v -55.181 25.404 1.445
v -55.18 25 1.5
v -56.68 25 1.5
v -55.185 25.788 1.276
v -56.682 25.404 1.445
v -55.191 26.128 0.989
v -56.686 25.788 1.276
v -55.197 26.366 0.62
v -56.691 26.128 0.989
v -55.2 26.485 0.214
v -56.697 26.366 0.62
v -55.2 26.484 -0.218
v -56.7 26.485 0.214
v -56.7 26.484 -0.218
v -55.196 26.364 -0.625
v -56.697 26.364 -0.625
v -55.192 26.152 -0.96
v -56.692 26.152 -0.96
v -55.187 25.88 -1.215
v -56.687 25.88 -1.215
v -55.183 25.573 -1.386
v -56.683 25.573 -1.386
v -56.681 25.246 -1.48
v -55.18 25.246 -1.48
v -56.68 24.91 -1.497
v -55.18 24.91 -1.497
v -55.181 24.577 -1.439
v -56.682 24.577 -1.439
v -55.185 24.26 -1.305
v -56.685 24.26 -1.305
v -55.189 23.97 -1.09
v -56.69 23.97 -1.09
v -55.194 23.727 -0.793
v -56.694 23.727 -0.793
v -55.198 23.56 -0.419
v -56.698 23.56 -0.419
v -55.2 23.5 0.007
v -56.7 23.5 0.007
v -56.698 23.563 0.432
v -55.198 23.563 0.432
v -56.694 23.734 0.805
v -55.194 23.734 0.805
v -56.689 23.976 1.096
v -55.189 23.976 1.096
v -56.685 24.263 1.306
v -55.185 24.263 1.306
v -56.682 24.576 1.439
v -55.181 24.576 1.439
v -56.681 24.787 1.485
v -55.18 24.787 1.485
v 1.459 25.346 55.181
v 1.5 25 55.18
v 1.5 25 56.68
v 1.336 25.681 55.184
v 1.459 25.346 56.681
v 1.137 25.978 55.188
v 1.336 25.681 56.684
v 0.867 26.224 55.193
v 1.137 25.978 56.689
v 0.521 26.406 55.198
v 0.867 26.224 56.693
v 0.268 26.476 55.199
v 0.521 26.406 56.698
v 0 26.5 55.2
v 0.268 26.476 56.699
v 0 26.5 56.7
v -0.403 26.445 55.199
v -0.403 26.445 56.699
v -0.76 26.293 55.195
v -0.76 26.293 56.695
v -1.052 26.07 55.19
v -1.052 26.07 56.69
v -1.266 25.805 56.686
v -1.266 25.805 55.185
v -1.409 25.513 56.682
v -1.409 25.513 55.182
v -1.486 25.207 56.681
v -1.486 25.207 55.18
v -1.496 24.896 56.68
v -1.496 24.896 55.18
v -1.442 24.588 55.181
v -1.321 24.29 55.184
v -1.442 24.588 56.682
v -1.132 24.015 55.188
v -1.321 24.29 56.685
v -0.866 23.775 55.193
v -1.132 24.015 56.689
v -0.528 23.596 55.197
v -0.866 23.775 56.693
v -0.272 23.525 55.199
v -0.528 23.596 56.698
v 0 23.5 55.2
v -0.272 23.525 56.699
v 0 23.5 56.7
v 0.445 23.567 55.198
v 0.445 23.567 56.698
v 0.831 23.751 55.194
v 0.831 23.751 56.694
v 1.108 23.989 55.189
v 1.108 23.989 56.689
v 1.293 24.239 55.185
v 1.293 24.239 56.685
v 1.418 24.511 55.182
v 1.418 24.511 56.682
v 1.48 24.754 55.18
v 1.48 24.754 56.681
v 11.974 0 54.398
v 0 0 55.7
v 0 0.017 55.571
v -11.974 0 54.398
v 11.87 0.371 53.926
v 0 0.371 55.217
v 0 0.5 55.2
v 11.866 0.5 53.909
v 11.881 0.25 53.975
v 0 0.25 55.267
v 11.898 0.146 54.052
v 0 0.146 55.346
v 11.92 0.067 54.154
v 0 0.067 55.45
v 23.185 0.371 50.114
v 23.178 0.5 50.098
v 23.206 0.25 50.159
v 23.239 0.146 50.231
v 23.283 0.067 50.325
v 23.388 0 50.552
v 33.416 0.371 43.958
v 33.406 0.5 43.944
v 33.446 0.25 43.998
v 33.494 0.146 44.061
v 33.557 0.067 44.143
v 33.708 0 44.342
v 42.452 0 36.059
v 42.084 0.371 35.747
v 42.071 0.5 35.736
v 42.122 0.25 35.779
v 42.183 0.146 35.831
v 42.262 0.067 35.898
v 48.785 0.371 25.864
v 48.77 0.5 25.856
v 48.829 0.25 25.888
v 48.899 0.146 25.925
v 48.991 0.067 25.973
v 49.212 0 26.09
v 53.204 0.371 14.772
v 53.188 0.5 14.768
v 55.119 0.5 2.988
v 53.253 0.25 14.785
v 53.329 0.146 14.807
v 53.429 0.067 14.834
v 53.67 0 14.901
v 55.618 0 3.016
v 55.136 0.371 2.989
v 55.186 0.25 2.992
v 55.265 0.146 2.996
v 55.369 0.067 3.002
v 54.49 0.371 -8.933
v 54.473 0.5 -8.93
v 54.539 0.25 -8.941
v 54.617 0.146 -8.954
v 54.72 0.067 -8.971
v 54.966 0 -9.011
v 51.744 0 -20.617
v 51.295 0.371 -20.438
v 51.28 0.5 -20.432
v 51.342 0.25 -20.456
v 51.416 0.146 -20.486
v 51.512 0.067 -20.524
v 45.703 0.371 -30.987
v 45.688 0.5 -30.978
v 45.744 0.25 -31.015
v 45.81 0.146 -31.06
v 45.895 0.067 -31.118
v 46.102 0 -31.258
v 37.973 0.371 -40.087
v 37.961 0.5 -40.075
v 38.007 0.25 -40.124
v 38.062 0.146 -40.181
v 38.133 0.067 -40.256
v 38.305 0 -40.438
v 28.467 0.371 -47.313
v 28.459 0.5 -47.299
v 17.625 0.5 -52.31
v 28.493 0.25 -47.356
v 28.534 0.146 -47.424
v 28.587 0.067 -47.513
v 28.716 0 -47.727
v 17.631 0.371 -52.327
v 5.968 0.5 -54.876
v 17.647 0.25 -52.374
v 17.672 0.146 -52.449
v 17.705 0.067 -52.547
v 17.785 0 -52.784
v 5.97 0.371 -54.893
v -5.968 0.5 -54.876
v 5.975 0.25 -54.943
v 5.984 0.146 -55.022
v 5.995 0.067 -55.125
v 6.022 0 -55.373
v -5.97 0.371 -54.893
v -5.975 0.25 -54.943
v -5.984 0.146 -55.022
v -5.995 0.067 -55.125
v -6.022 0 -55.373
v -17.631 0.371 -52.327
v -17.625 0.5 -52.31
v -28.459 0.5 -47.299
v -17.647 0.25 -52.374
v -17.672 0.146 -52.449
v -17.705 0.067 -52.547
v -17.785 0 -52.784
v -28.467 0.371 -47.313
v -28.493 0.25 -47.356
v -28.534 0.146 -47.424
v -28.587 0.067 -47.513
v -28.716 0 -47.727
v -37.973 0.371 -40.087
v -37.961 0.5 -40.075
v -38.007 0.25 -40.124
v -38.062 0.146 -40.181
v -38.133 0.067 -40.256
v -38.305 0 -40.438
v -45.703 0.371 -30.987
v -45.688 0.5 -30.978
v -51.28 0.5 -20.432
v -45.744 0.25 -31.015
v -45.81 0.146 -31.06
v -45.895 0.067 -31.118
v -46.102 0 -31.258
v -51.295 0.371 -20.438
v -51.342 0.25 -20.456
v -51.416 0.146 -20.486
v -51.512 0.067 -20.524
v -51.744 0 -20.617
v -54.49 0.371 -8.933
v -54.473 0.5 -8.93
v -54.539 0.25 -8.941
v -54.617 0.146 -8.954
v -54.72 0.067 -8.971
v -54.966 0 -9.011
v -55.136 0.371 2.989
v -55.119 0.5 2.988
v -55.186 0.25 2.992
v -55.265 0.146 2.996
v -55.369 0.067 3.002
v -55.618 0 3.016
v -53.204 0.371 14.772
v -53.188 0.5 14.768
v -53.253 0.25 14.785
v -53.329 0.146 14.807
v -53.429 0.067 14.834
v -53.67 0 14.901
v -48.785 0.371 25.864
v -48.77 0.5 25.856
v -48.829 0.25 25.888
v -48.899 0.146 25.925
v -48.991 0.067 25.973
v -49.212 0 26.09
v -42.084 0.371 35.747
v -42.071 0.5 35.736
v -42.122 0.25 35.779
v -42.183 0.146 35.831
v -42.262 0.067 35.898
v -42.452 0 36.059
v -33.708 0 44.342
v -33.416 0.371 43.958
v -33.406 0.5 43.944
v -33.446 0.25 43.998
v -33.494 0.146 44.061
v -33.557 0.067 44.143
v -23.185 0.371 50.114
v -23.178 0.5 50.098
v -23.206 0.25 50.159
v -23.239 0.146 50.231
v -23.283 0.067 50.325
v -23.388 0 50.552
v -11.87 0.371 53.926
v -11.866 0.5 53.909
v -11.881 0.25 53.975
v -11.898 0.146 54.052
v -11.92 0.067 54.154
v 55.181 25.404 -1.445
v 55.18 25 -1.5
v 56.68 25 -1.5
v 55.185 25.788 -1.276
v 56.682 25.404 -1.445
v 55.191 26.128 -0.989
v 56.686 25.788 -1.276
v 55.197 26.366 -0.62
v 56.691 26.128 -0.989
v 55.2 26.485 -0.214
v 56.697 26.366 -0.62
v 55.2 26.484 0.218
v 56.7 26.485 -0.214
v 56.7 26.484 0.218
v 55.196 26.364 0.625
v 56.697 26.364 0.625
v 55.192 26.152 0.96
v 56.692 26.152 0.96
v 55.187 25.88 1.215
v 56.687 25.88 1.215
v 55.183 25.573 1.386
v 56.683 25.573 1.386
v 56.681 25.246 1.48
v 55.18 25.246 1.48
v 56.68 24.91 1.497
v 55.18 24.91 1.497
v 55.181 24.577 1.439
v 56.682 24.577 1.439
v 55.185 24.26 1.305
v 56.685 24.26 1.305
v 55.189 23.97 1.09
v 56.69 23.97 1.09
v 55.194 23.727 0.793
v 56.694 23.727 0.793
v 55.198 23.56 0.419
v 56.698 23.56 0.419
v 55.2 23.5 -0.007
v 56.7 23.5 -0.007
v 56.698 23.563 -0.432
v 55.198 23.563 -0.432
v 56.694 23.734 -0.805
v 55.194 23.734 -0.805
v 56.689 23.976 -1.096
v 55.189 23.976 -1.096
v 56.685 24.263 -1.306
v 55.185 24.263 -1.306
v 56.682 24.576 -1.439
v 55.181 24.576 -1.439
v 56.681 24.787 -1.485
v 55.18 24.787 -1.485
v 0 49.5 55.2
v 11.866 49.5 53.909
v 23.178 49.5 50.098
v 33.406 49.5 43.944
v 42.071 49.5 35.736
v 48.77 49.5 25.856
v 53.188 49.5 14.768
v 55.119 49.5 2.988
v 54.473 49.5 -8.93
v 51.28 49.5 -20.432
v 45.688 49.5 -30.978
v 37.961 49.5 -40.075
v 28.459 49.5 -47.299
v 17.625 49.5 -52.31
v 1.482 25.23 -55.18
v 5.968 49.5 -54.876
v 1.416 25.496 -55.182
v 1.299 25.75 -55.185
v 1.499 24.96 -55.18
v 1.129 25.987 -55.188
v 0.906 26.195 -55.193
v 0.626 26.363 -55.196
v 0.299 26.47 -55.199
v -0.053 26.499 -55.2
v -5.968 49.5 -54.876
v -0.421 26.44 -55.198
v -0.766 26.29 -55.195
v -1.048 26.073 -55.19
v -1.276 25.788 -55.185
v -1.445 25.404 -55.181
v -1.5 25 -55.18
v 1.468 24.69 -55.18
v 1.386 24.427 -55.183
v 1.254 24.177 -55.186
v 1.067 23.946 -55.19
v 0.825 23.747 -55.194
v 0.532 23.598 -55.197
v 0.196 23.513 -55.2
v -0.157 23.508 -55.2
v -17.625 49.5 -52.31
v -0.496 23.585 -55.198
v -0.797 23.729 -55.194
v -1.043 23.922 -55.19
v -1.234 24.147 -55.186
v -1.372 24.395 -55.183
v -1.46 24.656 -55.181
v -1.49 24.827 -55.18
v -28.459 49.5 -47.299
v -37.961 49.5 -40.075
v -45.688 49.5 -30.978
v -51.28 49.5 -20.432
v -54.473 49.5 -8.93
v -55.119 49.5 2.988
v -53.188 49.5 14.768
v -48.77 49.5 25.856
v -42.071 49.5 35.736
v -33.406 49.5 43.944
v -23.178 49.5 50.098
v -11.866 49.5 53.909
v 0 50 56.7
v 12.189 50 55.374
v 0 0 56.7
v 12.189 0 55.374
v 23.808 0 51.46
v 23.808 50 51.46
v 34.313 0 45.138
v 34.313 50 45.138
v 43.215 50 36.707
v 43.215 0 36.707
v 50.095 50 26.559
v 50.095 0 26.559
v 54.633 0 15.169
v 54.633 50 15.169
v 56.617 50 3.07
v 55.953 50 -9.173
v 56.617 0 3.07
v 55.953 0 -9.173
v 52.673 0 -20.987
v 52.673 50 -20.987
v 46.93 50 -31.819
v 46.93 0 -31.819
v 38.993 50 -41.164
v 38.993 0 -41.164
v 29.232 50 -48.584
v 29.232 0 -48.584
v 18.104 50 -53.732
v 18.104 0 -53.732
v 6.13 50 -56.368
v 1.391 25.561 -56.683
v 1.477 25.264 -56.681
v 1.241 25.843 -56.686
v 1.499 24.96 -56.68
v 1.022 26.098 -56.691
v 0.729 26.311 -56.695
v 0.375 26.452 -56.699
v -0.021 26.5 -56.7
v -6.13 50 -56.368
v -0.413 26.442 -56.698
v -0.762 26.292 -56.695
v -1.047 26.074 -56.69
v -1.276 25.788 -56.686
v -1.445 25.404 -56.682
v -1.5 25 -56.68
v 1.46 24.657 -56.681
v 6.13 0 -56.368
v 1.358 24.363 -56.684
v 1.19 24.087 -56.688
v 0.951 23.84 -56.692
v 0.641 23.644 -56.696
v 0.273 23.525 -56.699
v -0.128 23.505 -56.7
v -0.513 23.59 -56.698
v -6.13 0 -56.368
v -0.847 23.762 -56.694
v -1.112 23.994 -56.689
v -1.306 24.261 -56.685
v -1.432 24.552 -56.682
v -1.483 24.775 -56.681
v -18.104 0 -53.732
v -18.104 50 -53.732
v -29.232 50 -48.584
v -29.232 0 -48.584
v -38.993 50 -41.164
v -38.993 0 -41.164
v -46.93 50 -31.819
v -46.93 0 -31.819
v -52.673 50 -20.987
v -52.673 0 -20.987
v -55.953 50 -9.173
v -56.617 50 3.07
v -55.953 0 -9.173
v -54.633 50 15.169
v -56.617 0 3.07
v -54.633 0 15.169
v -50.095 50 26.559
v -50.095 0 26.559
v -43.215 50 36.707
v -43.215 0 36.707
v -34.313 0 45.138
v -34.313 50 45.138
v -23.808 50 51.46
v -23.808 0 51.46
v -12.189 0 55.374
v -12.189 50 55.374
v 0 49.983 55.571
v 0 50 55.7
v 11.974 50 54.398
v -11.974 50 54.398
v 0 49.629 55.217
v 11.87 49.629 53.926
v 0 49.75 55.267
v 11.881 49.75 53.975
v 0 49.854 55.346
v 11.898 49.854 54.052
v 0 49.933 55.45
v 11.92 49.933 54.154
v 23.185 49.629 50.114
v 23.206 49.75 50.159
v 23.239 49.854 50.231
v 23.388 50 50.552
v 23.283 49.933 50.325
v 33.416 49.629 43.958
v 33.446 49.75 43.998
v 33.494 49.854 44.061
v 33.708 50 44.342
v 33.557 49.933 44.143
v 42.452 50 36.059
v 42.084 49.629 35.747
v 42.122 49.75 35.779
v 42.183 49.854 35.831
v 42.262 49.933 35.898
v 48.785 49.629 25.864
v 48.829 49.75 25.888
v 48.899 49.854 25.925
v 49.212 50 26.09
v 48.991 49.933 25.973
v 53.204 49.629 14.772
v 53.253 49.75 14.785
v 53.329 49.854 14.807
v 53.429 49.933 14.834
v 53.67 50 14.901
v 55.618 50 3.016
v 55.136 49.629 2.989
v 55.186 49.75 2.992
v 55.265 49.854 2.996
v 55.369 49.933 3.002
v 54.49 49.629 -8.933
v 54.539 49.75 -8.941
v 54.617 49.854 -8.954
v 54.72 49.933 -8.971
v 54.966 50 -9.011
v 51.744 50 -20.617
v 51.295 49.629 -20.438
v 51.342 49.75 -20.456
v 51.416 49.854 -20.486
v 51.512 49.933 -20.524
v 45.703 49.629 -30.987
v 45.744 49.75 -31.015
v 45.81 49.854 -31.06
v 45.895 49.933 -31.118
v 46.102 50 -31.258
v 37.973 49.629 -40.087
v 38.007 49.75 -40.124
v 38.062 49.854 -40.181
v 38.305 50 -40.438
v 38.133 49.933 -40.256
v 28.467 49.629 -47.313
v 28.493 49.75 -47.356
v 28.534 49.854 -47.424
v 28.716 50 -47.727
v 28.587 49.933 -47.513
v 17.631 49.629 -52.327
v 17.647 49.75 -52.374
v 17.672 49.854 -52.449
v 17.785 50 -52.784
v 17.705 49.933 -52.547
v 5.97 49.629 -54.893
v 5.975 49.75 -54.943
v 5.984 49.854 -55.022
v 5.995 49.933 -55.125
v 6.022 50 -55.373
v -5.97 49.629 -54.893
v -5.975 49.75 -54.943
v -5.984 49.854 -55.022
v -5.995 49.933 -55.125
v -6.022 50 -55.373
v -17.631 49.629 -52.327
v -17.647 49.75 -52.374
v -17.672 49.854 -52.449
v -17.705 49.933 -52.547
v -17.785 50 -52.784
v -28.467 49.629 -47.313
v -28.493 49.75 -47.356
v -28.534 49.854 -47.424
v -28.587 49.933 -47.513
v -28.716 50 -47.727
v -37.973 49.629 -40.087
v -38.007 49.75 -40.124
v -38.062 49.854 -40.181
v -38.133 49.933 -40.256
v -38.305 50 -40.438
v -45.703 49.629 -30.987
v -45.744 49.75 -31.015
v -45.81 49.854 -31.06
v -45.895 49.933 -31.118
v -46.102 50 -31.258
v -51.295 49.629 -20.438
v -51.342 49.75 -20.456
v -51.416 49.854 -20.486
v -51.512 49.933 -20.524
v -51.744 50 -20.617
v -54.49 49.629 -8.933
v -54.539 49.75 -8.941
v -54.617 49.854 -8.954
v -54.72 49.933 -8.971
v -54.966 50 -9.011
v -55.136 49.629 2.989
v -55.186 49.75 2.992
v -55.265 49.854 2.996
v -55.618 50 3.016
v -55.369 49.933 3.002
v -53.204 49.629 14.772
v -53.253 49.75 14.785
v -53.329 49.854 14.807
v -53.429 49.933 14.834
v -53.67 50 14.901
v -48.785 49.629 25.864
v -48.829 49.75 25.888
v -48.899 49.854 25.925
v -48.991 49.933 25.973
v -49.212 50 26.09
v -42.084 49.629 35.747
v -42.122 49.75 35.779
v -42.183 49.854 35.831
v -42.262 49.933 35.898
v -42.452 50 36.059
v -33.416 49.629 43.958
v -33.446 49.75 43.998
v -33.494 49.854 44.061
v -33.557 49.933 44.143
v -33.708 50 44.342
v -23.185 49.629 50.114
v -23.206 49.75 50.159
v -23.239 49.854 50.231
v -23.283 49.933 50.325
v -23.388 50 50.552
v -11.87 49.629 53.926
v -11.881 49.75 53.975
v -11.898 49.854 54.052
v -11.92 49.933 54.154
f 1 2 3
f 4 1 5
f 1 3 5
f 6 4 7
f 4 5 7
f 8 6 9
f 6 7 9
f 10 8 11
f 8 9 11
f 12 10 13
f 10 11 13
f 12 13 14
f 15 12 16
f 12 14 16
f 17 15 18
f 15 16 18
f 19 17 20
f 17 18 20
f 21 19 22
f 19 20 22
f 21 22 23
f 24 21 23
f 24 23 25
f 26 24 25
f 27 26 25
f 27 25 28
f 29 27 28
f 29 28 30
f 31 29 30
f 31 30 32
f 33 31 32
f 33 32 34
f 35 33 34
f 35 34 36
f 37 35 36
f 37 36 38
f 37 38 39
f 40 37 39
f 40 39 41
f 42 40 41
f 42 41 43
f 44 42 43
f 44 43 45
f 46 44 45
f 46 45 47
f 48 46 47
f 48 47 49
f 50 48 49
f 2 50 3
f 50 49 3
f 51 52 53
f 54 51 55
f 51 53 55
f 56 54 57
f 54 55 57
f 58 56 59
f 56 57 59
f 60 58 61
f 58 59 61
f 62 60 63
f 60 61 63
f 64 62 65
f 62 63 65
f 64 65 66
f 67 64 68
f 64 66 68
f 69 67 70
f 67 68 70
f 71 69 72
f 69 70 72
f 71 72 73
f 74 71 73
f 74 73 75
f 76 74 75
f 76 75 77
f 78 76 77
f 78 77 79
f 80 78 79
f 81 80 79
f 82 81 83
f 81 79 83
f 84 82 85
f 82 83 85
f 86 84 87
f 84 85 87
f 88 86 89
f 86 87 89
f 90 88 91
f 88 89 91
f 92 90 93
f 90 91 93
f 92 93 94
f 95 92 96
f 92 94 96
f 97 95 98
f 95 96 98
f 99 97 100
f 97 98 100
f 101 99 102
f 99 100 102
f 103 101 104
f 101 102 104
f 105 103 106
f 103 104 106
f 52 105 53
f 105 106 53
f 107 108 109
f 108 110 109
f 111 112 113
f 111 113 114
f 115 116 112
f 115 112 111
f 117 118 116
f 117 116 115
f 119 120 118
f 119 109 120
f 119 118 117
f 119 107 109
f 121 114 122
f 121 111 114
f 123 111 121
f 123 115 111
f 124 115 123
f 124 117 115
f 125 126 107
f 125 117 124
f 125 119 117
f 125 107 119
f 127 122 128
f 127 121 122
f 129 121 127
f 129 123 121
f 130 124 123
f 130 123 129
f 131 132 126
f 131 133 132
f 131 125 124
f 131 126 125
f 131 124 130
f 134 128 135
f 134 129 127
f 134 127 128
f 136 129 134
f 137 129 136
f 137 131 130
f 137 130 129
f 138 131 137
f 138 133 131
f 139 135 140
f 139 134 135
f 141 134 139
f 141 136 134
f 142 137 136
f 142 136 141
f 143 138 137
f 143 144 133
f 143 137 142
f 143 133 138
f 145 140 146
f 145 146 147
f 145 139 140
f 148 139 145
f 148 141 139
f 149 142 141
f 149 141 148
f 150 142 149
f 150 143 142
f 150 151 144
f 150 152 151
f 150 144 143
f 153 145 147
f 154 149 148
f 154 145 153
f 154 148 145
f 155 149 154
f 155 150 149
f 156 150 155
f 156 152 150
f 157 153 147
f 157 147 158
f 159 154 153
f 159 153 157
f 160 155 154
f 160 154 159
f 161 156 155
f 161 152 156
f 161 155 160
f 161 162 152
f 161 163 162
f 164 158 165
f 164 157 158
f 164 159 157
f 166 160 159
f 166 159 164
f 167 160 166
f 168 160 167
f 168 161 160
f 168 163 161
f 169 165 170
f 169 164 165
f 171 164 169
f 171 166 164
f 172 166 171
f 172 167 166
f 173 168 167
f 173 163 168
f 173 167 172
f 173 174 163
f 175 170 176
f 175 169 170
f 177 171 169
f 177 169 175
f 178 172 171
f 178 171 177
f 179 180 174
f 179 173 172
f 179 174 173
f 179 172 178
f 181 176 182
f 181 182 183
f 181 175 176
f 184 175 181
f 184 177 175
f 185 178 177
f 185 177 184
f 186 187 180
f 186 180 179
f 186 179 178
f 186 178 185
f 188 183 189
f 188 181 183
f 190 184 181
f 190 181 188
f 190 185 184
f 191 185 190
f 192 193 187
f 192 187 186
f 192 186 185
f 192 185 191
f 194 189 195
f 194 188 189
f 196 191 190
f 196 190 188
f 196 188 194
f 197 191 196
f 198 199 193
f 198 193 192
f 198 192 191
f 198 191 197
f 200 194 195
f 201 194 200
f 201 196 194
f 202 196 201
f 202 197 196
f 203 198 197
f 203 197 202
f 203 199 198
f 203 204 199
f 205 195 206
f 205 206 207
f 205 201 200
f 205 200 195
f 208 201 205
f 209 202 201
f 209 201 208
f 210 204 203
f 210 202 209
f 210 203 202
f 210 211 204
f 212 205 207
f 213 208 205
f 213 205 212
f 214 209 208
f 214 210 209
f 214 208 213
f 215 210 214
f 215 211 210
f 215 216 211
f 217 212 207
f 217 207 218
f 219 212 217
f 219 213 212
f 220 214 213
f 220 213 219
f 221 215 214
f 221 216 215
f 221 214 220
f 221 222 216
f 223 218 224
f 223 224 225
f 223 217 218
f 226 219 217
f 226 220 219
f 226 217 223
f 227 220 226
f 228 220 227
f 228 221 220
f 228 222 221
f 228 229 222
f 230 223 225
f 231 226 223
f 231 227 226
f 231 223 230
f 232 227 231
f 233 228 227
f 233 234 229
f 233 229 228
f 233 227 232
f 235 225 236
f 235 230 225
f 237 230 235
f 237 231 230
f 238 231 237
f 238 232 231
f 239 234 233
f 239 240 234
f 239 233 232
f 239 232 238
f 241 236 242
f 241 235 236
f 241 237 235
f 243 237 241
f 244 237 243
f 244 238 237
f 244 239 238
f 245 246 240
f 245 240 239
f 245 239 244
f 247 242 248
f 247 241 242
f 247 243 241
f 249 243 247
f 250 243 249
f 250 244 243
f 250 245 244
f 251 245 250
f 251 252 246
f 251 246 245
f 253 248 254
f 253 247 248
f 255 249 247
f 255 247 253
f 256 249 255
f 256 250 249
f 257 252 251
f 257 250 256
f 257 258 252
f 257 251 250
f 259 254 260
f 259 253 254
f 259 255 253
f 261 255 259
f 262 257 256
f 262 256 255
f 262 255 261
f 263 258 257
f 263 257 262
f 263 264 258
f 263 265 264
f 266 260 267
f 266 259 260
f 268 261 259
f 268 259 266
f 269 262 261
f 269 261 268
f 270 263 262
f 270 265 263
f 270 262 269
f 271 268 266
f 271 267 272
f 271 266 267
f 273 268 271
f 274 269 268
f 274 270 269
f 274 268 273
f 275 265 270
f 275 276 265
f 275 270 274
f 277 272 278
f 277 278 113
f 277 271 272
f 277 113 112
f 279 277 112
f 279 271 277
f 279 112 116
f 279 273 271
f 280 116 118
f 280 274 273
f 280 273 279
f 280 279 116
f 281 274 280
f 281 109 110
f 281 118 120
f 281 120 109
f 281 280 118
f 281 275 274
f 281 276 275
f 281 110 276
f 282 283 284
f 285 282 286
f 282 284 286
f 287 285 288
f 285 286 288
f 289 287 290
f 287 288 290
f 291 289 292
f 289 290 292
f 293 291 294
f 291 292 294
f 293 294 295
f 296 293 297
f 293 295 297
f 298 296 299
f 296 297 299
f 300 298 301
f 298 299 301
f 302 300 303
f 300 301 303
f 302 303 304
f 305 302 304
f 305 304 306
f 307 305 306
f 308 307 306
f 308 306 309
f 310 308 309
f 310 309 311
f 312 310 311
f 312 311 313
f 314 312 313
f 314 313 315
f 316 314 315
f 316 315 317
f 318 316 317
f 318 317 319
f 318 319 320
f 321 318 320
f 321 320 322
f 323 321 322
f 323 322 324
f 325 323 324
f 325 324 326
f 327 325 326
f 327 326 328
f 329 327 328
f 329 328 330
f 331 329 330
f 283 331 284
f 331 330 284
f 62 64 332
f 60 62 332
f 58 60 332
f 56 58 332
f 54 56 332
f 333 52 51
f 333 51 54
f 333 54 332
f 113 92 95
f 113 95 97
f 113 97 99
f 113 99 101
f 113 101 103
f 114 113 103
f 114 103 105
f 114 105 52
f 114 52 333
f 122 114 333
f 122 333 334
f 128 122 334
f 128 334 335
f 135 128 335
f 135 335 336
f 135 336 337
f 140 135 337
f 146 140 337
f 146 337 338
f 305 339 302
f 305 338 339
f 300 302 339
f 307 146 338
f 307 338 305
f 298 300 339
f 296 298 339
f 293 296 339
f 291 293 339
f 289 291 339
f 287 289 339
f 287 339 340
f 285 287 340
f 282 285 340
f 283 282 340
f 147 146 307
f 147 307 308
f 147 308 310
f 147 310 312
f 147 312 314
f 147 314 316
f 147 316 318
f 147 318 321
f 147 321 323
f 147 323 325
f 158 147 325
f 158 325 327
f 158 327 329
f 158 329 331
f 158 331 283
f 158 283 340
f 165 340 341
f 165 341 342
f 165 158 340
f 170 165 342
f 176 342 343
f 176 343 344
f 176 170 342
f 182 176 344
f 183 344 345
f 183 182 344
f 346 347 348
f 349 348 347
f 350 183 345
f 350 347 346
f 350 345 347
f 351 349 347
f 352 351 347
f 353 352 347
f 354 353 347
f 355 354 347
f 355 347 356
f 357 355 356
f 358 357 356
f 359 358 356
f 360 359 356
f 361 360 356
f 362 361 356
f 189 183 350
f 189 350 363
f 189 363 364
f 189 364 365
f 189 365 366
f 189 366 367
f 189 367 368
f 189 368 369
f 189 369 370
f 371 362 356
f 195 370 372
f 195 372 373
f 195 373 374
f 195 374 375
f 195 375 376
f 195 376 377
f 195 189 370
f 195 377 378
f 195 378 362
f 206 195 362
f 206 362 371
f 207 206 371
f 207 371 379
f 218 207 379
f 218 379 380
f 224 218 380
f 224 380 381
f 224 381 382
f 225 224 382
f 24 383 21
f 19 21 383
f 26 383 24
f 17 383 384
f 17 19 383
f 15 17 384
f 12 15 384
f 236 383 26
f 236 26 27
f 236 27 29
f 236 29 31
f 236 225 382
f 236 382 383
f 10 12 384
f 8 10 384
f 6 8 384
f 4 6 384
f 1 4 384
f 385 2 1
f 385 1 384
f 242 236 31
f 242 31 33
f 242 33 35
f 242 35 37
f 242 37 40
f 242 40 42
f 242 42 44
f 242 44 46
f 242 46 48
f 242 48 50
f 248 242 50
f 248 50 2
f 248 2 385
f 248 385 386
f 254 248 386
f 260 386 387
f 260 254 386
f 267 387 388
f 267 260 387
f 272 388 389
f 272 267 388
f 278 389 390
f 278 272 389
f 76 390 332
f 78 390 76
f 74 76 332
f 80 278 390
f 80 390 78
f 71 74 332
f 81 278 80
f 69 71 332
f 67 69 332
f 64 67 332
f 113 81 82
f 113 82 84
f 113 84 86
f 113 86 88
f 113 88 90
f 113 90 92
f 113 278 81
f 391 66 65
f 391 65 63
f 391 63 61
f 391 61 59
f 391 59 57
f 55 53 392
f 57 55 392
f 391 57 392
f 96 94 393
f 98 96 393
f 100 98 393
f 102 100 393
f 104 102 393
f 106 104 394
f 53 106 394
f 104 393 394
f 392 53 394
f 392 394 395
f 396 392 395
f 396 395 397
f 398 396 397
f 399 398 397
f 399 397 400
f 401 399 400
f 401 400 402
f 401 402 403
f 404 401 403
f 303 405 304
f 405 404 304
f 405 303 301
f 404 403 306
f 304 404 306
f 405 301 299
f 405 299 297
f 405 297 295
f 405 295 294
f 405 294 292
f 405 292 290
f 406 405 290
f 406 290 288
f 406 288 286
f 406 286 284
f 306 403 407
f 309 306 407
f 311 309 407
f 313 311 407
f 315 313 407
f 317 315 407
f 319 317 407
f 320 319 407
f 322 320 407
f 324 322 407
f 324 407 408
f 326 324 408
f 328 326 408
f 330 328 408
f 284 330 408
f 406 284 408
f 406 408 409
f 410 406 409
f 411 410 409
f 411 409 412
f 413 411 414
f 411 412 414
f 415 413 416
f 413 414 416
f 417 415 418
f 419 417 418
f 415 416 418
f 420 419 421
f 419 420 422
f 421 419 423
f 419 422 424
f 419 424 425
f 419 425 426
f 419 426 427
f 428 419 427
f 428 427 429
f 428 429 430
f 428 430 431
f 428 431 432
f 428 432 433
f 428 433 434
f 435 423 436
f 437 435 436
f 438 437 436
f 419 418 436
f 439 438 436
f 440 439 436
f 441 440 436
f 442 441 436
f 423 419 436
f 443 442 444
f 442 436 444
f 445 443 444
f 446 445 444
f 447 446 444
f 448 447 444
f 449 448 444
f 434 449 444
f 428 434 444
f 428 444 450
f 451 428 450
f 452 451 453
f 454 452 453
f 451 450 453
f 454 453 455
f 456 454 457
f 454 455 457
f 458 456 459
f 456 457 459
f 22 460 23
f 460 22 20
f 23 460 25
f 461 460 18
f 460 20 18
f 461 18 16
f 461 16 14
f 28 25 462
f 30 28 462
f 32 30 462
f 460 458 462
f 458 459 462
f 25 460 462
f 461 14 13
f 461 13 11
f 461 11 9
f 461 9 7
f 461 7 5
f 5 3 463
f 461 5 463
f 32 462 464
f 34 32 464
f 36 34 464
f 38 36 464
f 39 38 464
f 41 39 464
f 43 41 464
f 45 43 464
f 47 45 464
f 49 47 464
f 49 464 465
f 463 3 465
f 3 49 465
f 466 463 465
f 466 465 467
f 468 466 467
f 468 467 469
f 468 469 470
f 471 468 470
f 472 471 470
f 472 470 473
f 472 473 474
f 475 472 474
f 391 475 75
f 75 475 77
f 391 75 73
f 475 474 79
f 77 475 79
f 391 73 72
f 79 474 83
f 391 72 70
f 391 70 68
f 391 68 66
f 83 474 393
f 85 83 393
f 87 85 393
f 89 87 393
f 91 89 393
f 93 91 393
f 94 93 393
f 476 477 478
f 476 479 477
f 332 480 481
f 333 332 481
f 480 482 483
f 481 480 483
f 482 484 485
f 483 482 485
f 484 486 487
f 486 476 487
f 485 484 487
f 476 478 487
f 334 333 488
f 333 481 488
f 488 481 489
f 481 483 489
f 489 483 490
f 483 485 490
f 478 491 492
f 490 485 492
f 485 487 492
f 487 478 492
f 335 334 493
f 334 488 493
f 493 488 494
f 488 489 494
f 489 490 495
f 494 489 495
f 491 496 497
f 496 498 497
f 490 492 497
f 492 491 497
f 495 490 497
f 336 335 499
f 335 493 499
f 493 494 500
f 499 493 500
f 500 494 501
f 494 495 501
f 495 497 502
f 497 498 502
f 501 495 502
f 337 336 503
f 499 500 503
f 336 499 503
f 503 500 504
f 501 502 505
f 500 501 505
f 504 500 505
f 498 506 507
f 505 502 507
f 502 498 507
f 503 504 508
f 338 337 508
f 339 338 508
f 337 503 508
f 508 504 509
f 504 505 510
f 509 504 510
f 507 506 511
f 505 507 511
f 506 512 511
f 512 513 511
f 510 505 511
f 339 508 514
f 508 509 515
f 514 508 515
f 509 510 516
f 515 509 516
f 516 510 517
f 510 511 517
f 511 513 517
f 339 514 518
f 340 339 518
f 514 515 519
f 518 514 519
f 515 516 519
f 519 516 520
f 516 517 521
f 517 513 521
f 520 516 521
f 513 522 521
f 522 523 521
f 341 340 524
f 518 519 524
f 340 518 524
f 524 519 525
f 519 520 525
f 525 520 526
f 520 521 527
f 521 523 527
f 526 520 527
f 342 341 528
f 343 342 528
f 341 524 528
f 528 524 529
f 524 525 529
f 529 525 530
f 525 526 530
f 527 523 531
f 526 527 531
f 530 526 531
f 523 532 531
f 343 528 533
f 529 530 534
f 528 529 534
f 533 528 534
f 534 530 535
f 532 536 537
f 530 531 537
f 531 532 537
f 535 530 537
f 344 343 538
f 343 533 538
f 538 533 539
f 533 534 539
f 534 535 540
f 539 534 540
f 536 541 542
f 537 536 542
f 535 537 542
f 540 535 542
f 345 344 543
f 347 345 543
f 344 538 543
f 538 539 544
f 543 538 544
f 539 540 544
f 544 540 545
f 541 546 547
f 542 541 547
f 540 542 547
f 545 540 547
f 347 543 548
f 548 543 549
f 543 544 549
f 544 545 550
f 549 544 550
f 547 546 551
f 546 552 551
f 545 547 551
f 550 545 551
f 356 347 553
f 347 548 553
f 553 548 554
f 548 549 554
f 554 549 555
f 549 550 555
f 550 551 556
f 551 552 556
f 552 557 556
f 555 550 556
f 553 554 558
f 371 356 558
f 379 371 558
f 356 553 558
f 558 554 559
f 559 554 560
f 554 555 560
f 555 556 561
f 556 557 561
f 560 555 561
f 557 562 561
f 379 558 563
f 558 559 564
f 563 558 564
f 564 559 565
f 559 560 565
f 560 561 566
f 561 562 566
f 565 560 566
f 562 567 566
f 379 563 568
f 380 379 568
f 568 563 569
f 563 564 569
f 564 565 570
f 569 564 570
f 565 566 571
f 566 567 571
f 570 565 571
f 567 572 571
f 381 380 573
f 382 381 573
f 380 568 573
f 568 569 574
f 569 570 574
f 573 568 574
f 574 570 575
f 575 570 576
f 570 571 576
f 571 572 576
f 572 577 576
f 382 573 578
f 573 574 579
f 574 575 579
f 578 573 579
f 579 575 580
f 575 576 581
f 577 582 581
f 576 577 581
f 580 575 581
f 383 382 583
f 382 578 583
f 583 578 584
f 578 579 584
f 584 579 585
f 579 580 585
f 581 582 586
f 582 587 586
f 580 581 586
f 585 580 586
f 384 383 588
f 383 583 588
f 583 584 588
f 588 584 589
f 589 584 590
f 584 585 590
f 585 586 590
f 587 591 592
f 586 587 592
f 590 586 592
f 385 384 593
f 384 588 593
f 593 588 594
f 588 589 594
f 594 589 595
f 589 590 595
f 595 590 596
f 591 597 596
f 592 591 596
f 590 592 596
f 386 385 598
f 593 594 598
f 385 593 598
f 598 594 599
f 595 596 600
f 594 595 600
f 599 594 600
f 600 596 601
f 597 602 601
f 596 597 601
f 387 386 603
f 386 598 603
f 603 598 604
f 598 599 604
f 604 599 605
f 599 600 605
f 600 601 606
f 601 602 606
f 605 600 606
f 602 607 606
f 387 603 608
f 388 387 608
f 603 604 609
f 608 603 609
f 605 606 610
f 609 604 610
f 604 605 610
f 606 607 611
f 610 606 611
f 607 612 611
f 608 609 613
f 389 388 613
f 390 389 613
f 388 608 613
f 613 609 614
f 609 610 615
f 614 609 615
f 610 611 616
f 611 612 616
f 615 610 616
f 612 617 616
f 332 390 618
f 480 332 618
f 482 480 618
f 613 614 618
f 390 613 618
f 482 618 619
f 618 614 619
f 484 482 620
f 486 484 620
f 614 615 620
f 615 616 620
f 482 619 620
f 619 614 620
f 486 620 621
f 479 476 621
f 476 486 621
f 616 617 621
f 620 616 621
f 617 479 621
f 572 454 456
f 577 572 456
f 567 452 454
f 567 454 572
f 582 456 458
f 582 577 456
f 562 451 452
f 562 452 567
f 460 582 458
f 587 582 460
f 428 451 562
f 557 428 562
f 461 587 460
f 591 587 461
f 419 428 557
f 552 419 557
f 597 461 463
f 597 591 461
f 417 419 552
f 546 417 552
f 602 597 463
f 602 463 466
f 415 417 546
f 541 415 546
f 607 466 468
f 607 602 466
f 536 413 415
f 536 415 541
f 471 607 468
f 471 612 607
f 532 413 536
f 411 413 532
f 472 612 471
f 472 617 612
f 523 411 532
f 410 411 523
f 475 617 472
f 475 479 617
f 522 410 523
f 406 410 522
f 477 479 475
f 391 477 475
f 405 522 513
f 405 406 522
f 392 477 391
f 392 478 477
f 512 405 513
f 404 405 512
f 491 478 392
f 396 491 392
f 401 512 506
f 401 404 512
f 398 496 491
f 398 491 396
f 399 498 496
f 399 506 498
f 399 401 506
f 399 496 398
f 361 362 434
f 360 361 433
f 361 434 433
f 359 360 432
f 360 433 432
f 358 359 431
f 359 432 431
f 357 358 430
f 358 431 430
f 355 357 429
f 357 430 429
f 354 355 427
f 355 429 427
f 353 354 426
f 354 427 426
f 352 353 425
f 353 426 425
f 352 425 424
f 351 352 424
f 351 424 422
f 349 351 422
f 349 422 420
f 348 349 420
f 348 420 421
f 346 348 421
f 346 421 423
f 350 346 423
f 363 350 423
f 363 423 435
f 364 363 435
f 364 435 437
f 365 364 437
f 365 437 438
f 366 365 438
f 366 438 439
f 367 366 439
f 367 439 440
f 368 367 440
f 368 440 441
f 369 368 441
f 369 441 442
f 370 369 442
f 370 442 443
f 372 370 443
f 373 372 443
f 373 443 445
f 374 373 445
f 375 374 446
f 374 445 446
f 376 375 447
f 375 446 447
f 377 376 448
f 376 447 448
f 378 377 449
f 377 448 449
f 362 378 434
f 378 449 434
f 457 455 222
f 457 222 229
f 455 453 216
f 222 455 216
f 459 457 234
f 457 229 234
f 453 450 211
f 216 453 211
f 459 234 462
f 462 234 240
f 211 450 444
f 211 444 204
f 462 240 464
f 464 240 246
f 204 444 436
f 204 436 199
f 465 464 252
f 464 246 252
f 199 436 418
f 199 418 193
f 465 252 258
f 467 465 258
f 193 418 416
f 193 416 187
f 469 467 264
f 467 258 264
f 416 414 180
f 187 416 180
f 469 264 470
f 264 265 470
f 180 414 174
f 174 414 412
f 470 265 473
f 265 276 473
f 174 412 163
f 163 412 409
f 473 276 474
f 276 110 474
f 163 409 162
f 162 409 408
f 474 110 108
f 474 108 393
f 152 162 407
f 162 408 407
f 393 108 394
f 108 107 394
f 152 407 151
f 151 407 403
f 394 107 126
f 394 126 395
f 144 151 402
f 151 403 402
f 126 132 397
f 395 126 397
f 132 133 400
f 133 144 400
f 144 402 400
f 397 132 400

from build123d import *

# Parameters (mm, degrees)
SKETCH1_R           = 56.7
SKETCH1_R_2         = 55.2
BOSS_EXTRUDE1_DEPTH = 50
FILLET1_R           = 0.5
SKETCH2_R           = 1.5
CUT_EXTRUDE1_DEPTH  = 10
CIRPATTERN1_COUNT   = 4


with BuildPart() as part:
    # Sketch1 → Boss-Extrude1 (new body)
    with BuildSketch(Plane(origin=(0, 0, 0), x_dir=(1, 0, 0), z_dir=(0, 1, 0))):
        with Locations(Location((0, 0, 0), (0, 0, 270))):
            Circle(SKETCH1_R)
        with Locations(Location((0, 0, 0), (0, 0, 270))):
            Circle(SKETCH1_R_2, mode=Mode.SUBTRACT)
    extrude(amount=BOSS_EXTRUDE1_DEPTH)

    # Fillet1
    fillet1_edges = [part.edges().sort_by_distance(p)[0] for p in [
        (0, 0, -55.2),
        (0, 50, -55.2),
    ]]
    fillet(fillet1_edges, radius=FILLET1_R)

    # Sketch2 → Cut-Extrude1 (cut)
    with BuildSketch(Plane(origin=(56.7, 0, 0), x_dir=(0, 0, -1), z_dir=(1, 0, 0))):
        with Locations((0, 25)):
            Circle(SKETCH2_R)
    cut_extrude1 = extrude(amount=-CUT_EXTRUDE1_DEPTH, mode=Mode.SUBTRACT)

    # CirPattern1: Cut-Extrude1 ×4 about axis
    cirpattern1_axis = Axis((0, 48.063508327, 0), (0, -1, 0))
    for i in range(1, CIRPATTERN1_COUNT):
        add(cut_extrude1.rotate(cirpattern1_axis, i * 360 / CIRPATTERN1_COUNT), mode=Mode.SUBTRACT)


solid = part.part
